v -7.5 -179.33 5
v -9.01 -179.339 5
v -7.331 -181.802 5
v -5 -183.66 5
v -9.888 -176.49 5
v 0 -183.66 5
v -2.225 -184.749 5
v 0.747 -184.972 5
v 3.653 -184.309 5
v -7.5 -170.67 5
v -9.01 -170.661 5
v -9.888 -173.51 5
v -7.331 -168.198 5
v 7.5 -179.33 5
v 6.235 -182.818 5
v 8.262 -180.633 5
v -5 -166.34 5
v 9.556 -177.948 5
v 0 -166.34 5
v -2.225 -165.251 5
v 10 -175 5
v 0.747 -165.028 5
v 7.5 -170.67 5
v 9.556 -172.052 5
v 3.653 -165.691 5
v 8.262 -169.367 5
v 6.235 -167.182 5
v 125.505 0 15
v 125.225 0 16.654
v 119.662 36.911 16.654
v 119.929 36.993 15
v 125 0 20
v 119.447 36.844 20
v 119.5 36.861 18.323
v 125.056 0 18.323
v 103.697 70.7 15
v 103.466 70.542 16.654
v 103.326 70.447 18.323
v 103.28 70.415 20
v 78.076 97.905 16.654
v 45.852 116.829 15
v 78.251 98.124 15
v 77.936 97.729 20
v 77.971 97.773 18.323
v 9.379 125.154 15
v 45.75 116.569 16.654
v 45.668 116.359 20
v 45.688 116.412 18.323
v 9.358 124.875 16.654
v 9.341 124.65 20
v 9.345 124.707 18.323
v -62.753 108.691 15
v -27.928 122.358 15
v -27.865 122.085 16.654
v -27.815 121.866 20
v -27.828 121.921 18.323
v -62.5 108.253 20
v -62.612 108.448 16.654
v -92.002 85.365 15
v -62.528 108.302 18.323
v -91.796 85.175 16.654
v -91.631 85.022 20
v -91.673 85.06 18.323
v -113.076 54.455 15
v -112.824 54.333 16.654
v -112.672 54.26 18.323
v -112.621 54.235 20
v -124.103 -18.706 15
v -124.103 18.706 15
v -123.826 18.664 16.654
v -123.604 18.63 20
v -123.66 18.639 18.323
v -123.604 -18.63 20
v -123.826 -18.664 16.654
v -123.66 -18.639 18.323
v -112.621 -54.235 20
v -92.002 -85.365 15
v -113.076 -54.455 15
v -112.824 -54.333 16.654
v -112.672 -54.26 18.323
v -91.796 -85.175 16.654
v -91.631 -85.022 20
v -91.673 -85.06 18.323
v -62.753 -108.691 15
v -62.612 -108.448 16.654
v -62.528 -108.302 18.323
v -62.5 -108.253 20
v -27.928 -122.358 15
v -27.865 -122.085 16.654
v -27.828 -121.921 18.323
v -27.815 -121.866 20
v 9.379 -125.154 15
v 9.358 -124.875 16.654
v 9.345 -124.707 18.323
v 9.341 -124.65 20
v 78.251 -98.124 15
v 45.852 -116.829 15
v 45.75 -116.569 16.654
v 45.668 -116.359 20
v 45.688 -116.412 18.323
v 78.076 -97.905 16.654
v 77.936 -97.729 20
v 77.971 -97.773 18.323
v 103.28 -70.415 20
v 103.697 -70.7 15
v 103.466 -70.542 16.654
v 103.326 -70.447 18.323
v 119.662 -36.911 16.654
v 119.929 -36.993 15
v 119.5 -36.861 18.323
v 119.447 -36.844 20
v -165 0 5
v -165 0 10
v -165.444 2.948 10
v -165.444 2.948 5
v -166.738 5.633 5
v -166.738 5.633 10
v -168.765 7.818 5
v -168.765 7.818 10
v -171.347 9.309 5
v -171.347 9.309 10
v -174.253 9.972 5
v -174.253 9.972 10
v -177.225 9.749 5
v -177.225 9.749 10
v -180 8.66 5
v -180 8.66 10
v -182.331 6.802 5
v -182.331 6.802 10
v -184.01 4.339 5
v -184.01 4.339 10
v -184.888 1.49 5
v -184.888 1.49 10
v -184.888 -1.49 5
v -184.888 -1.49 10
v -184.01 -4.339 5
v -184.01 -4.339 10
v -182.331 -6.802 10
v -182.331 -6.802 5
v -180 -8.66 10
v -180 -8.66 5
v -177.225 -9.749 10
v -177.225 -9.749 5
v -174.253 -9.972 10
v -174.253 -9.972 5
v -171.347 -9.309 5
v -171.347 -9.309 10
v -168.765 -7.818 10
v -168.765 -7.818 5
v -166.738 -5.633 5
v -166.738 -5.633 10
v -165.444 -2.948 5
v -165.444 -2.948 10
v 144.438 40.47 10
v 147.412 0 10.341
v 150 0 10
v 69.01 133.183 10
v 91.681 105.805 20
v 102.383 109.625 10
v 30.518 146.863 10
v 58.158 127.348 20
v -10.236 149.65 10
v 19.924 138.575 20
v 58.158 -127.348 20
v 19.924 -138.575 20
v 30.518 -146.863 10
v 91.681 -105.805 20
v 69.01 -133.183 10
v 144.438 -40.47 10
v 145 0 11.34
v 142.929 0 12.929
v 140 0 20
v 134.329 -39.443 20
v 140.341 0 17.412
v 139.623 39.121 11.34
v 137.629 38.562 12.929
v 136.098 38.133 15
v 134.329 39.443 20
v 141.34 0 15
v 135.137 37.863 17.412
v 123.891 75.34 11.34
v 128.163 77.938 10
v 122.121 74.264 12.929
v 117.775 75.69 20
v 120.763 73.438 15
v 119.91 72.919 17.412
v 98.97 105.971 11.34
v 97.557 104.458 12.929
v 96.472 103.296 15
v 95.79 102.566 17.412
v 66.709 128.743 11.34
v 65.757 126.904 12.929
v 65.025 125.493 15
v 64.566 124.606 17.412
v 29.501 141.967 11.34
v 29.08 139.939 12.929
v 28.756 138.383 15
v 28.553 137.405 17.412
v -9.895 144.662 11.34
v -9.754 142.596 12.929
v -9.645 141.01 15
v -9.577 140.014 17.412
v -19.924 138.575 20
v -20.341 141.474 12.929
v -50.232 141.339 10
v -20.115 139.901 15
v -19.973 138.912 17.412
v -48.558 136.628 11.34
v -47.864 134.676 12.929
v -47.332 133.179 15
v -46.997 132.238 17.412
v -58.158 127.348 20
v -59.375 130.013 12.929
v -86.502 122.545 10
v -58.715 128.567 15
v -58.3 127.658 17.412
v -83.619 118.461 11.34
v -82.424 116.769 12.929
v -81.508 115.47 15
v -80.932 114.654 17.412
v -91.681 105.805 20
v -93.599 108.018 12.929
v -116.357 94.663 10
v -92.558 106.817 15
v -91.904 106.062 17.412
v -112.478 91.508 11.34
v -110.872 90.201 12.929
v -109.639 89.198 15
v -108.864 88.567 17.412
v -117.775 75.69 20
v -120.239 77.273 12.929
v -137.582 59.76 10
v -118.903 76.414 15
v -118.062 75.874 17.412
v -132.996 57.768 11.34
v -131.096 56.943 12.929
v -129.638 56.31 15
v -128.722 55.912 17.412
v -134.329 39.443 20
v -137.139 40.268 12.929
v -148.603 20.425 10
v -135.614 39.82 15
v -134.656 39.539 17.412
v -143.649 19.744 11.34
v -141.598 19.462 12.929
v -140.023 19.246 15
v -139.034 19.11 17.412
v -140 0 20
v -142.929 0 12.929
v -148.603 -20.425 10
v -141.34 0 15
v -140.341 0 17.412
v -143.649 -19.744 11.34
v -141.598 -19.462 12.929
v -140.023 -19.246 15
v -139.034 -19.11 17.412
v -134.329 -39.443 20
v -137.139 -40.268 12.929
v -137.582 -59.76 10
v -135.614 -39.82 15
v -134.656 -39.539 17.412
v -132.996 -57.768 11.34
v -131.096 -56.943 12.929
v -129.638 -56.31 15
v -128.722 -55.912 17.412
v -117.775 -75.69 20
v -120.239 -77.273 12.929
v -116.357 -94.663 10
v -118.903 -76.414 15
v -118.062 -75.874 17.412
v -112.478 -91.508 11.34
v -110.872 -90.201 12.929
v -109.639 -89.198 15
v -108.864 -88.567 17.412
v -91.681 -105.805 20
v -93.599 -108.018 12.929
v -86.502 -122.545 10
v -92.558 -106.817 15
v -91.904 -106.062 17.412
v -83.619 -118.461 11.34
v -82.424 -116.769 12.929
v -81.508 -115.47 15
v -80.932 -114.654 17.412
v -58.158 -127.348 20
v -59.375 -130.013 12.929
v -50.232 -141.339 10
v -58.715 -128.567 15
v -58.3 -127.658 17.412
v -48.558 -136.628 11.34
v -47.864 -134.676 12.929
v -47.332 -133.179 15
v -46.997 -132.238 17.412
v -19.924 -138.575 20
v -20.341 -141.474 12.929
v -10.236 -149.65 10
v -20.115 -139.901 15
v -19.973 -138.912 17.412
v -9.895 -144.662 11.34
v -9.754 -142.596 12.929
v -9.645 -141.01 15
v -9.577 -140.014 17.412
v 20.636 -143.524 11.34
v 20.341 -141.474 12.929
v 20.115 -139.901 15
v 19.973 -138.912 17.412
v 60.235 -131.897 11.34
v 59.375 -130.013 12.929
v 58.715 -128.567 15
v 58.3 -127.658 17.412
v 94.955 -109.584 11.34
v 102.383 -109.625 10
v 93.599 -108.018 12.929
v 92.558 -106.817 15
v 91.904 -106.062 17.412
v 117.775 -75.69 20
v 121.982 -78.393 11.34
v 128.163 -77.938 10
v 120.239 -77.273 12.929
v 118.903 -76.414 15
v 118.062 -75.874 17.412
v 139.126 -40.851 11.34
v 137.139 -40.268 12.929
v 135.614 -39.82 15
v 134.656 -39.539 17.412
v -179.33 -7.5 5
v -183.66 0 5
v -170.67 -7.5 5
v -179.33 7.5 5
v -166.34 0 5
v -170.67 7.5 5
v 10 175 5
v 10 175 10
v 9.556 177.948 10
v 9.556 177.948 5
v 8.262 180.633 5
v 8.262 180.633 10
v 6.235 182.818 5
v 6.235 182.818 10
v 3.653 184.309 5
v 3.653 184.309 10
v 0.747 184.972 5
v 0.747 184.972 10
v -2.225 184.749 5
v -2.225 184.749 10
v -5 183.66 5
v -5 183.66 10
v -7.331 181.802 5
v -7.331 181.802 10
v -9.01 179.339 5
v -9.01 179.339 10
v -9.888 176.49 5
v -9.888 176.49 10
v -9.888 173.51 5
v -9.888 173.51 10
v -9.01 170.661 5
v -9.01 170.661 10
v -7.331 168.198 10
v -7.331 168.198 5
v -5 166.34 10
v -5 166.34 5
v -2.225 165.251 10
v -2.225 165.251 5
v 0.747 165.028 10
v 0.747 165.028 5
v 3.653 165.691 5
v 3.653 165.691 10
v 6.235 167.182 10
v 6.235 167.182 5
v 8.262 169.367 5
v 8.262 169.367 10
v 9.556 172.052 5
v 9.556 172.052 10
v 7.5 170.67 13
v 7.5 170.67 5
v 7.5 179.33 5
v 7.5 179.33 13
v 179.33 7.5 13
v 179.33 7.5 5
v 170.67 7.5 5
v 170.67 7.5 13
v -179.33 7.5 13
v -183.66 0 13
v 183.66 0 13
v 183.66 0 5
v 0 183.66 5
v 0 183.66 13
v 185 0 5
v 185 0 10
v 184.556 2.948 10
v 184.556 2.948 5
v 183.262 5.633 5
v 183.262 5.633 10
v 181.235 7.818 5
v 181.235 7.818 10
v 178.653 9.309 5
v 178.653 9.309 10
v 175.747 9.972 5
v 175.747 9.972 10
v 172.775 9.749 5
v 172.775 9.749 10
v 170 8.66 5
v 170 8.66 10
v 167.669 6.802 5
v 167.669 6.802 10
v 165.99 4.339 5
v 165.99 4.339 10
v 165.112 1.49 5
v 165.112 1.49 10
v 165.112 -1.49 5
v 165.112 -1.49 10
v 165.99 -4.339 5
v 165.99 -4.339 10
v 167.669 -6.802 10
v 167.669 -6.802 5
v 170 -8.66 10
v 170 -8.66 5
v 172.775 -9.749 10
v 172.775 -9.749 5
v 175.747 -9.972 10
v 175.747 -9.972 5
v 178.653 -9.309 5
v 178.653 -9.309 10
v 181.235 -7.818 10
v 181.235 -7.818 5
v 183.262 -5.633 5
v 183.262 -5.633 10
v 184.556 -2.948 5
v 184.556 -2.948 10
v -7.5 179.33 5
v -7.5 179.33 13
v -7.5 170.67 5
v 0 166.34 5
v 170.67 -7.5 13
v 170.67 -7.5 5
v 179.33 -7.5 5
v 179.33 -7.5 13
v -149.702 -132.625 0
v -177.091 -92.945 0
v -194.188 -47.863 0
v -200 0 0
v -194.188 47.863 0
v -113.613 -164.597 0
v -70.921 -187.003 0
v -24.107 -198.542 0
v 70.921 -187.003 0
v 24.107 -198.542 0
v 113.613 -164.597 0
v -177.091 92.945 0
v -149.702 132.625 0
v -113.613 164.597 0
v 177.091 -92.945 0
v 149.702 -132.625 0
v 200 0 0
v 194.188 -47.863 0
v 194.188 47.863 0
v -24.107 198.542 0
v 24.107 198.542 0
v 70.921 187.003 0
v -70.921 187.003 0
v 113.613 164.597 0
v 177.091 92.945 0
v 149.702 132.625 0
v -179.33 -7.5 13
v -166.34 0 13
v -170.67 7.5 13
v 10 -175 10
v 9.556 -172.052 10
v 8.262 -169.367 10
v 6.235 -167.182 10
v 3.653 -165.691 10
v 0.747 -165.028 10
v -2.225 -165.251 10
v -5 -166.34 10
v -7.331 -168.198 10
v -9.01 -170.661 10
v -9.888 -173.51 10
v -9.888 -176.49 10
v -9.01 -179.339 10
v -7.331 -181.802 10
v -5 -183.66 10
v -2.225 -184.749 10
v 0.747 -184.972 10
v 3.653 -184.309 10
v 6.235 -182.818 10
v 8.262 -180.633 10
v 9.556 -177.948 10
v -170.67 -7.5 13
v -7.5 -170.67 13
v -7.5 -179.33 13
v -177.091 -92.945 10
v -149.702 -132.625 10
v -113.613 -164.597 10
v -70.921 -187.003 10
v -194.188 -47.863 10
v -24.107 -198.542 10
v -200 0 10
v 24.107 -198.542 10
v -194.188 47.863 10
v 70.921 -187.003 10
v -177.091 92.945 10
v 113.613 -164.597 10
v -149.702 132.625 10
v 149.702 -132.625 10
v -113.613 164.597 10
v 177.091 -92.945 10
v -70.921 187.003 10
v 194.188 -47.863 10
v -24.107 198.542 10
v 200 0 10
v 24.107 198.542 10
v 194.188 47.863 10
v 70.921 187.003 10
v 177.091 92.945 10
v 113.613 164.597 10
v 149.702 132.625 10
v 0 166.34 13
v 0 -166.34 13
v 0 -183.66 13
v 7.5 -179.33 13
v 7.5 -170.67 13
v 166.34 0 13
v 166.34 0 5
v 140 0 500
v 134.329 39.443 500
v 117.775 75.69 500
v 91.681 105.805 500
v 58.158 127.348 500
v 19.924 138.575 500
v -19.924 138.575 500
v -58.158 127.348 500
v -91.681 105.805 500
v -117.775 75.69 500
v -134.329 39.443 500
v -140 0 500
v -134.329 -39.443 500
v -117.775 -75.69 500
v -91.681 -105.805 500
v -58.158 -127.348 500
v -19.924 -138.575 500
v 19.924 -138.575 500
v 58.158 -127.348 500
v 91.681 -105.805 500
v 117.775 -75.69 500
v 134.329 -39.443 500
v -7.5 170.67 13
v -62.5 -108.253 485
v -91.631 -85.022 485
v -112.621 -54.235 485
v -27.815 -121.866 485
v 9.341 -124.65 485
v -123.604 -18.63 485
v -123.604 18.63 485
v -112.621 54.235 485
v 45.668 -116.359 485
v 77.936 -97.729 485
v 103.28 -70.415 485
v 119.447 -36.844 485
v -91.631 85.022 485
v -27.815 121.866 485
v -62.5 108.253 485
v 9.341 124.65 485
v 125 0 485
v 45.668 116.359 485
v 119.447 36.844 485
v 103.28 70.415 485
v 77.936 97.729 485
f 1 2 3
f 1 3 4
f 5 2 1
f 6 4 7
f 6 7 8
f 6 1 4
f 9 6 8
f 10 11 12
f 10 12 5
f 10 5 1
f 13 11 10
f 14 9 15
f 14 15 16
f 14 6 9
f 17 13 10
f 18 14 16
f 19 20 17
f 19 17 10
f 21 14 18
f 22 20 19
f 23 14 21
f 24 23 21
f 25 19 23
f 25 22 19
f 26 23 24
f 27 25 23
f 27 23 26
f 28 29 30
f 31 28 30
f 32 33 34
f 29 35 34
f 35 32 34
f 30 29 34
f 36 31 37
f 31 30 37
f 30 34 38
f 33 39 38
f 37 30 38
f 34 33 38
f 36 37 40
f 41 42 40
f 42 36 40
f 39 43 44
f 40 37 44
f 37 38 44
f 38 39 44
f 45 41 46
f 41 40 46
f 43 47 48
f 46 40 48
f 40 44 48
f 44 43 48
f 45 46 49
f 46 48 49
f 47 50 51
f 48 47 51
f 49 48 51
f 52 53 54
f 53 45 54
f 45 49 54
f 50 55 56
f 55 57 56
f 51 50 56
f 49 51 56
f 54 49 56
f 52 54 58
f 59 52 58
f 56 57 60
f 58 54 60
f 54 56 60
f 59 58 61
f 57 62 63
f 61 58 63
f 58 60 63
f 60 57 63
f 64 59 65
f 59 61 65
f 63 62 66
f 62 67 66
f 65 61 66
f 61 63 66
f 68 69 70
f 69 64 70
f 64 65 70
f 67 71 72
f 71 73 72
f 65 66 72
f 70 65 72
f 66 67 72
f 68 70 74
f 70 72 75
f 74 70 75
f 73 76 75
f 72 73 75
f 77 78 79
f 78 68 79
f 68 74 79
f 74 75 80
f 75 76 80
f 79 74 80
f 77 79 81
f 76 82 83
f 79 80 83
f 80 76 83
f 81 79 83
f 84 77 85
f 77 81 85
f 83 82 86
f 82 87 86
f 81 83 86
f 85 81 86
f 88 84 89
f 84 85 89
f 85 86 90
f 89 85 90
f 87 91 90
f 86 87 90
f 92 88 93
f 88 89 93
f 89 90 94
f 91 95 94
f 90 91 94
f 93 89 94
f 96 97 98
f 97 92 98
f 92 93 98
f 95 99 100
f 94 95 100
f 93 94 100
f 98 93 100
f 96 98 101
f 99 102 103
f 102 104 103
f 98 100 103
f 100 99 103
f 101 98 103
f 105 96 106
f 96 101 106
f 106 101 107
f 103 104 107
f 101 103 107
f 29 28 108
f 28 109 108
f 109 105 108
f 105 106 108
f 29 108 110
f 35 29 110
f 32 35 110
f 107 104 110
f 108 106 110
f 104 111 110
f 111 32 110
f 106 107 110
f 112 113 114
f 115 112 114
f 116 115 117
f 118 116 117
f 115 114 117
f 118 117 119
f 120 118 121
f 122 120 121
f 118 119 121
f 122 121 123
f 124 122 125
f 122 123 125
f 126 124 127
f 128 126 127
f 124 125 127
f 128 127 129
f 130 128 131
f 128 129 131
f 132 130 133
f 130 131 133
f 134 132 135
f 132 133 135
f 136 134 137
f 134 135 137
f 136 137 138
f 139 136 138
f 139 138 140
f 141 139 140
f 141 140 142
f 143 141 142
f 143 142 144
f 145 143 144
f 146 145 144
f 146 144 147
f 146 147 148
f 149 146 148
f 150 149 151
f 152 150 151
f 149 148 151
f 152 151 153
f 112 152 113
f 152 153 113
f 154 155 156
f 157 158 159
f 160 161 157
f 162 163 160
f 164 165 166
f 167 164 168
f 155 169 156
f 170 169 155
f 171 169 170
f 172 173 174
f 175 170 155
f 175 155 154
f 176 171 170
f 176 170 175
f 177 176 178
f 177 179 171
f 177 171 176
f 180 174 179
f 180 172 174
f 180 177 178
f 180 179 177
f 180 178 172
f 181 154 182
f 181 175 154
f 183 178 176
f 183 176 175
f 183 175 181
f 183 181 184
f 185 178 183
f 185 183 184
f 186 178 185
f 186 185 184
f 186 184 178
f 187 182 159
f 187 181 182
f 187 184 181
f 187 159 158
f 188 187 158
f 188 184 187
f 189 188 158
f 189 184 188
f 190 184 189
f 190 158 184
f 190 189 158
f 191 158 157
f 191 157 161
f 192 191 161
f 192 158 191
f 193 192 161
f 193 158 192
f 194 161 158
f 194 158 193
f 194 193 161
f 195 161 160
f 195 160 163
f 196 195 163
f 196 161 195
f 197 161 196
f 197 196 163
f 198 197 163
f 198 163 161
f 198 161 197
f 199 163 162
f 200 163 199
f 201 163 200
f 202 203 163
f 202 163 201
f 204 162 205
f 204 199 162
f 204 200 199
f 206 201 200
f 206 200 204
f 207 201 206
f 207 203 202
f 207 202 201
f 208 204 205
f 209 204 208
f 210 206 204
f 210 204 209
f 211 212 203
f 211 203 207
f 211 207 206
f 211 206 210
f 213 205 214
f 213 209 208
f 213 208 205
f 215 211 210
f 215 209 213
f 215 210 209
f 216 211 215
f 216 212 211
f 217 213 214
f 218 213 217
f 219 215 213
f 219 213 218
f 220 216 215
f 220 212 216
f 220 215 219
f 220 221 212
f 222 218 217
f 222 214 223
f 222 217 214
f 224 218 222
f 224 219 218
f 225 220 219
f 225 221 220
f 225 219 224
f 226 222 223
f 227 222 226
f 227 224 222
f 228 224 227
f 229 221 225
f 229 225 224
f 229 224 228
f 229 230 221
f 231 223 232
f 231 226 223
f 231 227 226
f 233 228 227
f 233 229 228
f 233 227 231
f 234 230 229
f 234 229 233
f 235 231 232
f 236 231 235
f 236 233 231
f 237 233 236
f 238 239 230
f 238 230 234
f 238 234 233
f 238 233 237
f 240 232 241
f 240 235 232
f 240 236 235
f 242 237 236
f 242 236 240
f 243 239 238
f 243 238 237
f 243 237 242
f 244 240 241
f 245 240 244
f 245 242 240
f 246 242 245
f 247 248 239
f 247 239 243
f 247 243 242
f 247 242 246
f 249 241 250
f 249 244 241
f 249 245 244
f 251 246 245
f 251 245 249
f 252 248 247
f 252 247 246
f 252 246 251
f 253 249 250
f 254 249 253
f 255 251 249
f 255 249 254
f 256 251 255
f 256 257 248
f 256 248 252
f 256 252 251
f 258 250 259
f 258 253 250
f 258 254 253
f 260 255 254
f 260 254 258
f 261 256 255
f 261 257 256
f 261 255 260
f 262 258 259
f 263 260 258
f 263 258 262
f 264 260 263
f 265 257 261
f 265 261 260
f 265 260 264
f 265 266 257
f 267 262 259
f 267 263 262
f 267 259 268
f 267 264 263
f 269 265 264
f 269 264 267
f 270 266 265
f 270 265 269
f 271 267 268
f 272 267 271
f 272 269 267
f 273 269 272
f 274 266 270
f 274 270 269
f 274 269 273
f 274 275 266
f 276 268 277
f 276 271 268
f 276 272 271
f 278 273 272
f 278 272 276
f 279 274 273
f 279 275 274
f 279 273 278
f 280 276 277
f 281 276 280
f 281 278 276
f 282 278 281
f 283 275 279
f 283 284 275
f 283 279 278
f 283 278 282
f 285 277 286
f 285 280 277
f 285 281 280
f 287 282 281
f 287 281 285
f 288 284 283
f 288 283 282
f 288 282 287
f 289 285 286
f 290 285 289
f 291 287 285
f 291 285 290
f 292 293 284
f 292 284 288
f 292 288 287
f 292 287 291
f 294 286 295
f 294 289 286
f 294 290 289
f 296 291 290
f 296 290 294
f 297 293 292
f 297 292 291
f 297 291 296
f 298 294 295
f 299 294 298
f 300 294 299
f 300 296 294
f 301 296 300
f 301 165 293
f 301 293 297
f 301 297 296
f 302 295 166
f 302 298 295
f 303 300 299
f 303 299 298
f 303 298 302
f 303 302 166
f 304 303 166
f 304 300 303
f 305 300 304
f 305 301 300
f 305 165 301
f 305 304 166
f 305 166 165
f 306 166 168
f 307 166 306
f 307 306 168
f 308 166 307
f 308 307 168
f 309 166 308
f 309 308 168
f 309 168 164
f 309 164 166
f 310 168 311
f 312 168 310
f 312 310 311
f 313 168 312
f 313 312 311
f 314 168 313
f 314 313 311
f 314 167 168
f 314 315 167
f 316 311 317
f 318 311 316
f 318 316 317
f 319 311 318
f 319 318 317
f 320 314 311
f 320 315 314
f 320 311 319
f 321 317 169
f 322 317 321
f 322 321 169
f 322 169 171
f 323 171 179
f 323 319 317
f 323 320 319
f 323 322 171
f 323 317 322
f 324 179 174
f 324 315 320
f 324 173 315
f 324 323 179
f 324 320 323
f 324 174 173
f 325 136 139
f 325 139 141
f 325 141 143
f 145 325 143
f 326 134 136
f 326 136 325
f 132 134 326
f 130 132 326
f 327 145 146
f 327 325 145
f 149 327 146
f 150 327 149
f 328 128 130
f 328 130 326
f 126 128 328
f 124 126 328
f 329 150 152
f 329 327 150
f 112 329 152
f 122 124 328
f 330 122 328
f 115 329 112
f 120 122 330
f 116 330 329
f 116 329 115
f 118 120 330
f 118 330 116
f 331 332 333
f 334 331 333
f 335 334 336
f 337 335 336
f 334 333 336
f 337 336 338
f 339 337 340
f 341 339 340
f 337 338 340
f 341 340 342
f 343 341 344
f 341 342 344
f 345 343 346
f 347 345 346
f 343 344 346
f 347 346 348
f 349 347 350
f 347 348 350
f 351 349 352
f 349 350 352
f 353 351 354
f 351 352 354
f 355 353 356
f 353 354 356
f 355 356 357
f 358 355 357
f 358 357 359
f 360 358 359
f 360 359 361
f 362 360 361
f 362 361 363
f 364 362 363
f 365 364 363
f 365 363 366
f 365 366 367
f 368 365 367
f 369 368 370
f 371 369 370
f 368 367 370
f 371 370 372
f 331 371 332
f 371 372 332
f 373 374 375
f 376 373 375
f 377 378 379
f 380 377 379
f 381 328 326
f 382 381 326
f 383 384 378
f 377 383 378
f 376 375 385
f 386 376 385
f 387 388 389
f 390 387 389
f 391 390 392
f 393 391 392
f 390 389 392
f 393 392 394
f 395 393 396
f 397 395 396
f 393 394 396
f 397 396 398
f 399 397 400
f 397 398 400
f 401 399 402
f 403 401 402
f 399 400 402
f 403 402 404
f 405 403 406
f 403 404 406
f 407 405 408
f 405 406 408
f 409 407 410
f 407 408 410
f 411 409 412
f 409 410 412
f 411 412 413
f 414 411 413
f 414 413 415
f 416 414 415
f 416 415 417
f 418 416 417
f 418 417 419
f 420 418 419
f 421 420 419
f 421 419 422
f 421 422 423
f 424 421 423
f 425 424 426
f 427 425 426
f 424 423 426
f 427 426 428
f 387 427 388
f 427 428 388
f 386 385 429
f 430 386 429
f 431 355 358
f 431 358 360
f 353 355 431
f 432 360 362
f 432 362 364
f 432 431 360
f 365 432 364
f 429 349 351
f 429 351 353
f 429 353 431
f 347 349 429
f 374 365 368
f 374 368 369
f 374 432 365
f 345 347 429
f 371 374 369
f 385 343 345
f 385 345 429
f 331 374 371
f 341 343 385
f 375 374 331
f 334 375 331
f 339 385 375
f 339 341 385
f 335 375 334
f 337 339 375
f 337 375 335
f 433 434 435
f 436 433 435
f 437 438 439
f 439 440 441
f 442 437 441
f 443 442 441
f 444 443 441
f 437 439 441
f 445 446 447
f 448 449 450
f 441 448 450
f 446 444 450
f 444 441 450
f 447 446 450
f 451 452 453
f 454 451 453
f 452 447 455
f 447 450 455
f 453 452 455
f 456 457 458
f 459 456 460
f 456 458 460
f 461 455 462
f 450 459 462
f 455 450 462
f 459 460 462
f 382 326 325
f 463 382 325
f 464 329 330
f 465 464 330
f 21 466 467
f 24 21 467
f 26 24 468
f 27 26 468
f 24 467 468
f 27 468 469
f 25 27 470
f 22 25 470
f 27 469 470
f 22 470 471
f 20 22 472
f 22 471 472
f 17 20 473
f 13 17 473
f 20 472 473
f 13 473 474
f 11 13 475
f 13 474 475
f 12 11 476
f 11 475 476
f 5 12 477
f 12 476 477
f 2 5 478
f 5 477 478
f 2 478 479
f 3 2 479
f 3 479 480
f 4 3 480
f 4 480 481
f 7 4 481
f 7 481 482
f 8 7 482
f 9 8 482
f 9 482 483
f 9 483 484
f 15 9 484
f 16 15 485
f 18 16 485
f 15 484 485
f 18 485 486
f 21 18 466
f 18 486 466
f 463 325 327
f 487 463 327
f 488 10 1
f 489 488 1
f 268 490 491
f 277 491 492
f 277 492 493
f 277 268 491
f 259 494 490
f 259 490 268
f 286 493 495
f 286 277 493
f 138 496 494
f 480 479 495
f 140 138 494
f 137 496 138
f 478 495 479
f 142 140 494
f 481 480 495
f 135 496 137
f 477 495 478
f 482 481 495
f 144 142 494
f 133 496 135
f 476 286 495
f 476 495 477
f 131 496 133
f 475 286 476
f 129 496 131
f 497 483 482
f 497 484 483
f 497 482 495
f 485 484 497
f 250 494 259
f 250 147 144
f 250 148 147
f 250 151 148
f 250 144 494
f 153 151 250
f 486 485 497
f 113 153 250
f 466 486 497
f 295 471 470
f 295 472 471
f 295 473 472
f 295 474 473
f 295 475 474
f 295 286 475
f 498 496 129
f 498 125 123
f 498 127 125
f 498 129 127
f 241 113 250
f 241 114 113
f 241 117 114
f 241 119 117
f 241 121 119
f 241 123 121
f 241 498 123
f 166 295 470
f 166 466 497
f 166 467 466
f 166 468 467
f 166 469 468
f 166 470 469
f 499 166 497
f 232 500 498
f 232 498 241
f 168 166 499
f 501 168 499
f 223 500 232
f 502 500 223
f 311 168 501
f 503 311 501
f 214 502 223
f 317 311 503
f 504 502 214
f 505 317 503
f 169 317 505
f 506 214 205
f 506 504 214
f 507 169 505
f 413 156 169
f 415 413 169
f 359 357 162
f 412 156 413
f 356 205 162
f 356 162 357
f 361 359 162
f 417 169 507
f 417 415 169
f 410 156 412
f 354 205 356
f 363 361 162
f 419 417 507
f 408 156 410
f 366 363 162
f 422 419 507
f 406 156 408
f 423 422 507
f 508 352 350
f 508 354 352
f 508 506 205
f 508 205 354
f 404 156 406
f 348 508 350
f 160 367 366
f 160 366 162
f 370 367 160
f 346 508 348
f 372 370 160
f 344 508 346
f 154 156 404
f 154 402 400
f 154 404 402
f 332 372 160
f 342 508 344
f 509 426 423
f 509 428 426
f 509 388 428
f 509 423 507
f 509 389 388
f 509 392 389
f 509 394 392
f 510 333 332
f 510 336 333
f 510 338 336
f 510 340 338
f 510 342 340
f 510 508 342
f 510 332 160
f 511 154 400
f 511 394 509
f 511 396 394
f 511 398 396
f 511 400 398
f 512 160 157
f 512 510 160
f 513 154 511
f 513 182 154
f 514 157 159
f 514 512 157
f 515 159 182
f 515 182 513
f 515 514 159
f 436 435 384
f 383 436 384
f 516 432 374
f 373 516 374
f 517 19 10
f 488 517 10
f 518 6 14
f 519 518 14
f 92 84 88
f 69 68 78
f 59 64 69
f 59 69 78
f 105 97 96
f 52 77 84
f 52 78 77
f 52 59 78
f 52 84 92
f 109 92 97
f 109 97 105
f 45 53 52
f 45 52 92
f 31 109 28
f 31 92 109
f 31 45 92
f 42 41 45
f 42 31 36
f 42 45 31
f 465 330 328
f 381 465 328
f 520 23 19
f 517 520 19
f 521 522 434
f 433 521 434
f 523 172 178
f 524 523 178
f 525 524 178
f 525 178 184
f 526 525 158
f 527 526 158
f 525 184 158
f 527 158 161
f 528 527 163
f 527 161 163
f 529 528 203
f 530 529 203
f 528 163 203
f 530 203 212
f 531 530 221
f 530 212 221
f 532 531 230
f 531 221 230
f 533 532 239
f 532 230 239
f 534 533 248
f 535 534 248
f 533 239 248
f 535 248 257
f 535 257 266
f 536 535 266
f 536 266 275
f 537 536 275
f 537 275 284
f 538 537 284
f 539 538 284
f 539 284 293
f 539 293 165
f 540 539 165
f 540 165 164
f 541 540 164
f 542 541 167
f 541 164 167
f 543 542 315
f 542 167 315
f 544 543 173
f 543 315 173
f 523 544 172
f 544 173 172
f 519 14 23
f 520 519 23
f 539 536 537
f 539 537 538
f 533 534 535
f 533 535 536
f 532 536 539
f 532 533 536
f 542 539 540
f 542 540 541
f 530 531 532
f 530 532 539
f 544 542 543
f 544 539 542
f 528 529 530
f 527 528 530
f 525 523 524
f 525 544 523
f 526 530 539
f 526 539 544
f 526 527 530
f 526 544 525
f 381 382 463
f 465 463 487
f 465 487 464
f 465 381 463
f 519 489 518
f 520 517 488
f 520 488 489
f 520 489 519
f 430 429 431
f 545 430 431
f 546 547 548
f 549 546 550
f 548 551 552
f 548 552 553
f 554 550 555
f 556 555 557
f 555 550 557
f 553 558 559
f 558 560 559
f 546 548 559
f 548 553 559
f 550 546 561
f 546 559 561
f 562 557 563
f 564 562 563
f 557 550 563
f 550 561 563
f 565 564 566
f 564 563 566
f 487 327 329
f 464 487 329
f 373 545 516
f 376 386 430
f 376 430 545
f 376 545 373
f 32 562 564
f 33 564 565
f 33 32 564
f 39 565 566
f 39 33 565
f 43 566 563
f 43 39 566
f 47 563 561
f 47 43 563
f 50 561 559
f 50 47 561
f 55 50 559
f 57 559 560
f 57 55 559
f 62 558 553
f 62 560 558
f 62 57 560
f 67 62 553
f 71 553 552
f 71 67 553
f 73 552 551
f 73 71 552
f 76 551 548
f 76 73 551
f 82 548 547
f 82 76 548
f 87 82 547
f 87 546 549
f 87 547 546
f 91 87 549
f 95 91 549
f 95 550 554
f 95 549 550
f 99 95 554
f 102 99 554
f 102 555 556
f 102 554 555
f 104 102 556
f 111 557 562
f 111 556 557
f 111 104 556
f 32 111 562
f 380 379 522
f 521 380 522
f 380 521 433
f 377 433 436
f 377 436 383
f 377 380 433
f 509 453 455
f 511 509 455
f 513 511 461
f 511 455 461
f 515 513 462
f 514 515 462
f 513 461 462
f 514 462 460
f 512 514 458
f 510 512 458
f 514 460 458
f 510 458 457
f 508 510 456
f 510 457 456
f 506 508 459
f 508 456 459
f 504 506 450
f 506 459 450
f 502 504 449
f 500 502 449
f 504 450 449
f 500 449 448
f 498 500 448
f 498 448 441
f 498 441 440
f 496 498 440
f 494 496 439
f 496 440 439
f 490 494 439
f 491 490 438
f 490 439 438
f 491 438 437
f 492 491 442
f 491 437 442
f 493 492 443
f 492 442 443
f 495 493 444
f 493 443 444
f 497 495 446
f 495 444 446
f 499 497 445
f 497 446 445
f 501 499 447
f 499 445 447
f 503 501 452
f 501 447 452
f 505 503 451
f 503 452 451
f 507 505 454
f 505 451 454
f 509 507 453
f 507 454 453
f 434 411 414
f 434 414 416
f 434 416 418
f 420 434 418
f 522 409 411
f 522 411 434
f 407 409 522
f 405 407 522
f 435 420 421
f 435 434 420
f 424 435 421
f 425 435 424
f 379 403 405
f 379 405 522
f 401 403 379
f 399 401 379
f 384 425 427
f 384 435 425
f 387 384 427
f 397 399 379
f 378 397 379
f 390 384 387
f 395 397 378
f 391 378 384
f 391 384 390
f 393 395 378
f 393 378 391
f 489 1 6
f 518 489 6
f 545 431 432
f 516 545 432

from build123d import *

# Parameters (mm, degrees)
SKIZZE1_R                       = 200
AUFSATZ_LINEAR_AUSTRAGEN1_DEPTH = 10
SKIZZE2_R                       = 140
AUFSATZ_LINEAR_AUSTRAGEN2_DEPTH = 490
VERRUNDUNG2_R                   = 10
SKIZZE8_R                       = 10
SCHNITT_LINEAR_AUSTRAGEN1_DEPTH = 5
AUFSATZ_LINEAR_AUSTRAGEN4_DEPTH = 8
WANDUNG1_T                      = 15


with BuildPart() as part:
    # Skizze1 → Aufsatz-Linear austragen1 (new body)
    with BuildSketch(Plane.XY):
        Circle(SKIZZE1_R)
    extrude(amount=AUFSATZ_LINEAR_AUSTRAGEN1_DEPTH)

    # Skizze2 → Aufsatz-Linear austragen2 (add)
    with BuildSketch(Plane.XY.offset(10)):
        Circle(SKIZZE2_R)
    extrude(amount=AUFSATZ_LINEAR_AUSTRAGEN2_DEPTH)

    # Verrundung2
    verrundung2_edges = [part.edges().sort_by_distance(p)[0] for p in [
        (-140, 0, 10),
    ]]
    fillet(verrundung2_edges, radius=VERRUNDUNG2_R)

    # Skizze8 → Schnitt-Linear austragen1 (cut)
    with BuildSketch(Plane.XY.offset(10)):
        with Locations((0, 175)):
            Circle(SKIZZE8_R)
        with Locations((175, 0)):
            Circle(SKIZZE8_R)
        with Locations((0, -175)):
            Circle(SKIZZE8_R)
        with Locations((-175, 0)):
            Circle(SKIZZE8_R)
    extrude(amount=-SCHNITT_LINEAR_AUSTRAGEN1_DEPTH, mode=Mode.SUBTRACT)

    # Skizze9 → Aufsatz-Linear austragen4 (add)
    with BuildSketch(Plane.XY.offset(5)):
        Polygon((0, 166.339745962), (7.5, 170.669872981), (7.5, 179.330127019), (0, 183.660254038), (-7.5, 179.330127019), (-7.5, 170.669872981), align=None)
        Polygon((-166.339745962, 0), (-170.669872981, 7.5), (-179.330127019, 7.5), (-183.660254038, 0), (-179.330127019, -7.5), (-170.669872981, -7.5), align=None)
        Polygon((166.339745962, 0), (170.669872981, -7.5), (179.330127019, -7.5), (183.660254038, 0), (179.330127019, 7.5), (170.669872981, 7.5), align=None)
        Polygon((0, -166.339745962), (-7.5, -170.669872981), (-7.5, -179.330127019), (0, -183.660254038), (7.5, -179.330127019), (7.5, -170.669872981), align=None)
    extrude(amount=AUFSATZ_LINEAR_AUSTRAGEN4_DEPTH)

    # Wandung1 (no face opened: a closed hollow body)
    add(offset(amount=-WANDUNG1_T, mode=Mode.PRIVATE), mode=Mode.SUBTRACT)


solid = part.part
